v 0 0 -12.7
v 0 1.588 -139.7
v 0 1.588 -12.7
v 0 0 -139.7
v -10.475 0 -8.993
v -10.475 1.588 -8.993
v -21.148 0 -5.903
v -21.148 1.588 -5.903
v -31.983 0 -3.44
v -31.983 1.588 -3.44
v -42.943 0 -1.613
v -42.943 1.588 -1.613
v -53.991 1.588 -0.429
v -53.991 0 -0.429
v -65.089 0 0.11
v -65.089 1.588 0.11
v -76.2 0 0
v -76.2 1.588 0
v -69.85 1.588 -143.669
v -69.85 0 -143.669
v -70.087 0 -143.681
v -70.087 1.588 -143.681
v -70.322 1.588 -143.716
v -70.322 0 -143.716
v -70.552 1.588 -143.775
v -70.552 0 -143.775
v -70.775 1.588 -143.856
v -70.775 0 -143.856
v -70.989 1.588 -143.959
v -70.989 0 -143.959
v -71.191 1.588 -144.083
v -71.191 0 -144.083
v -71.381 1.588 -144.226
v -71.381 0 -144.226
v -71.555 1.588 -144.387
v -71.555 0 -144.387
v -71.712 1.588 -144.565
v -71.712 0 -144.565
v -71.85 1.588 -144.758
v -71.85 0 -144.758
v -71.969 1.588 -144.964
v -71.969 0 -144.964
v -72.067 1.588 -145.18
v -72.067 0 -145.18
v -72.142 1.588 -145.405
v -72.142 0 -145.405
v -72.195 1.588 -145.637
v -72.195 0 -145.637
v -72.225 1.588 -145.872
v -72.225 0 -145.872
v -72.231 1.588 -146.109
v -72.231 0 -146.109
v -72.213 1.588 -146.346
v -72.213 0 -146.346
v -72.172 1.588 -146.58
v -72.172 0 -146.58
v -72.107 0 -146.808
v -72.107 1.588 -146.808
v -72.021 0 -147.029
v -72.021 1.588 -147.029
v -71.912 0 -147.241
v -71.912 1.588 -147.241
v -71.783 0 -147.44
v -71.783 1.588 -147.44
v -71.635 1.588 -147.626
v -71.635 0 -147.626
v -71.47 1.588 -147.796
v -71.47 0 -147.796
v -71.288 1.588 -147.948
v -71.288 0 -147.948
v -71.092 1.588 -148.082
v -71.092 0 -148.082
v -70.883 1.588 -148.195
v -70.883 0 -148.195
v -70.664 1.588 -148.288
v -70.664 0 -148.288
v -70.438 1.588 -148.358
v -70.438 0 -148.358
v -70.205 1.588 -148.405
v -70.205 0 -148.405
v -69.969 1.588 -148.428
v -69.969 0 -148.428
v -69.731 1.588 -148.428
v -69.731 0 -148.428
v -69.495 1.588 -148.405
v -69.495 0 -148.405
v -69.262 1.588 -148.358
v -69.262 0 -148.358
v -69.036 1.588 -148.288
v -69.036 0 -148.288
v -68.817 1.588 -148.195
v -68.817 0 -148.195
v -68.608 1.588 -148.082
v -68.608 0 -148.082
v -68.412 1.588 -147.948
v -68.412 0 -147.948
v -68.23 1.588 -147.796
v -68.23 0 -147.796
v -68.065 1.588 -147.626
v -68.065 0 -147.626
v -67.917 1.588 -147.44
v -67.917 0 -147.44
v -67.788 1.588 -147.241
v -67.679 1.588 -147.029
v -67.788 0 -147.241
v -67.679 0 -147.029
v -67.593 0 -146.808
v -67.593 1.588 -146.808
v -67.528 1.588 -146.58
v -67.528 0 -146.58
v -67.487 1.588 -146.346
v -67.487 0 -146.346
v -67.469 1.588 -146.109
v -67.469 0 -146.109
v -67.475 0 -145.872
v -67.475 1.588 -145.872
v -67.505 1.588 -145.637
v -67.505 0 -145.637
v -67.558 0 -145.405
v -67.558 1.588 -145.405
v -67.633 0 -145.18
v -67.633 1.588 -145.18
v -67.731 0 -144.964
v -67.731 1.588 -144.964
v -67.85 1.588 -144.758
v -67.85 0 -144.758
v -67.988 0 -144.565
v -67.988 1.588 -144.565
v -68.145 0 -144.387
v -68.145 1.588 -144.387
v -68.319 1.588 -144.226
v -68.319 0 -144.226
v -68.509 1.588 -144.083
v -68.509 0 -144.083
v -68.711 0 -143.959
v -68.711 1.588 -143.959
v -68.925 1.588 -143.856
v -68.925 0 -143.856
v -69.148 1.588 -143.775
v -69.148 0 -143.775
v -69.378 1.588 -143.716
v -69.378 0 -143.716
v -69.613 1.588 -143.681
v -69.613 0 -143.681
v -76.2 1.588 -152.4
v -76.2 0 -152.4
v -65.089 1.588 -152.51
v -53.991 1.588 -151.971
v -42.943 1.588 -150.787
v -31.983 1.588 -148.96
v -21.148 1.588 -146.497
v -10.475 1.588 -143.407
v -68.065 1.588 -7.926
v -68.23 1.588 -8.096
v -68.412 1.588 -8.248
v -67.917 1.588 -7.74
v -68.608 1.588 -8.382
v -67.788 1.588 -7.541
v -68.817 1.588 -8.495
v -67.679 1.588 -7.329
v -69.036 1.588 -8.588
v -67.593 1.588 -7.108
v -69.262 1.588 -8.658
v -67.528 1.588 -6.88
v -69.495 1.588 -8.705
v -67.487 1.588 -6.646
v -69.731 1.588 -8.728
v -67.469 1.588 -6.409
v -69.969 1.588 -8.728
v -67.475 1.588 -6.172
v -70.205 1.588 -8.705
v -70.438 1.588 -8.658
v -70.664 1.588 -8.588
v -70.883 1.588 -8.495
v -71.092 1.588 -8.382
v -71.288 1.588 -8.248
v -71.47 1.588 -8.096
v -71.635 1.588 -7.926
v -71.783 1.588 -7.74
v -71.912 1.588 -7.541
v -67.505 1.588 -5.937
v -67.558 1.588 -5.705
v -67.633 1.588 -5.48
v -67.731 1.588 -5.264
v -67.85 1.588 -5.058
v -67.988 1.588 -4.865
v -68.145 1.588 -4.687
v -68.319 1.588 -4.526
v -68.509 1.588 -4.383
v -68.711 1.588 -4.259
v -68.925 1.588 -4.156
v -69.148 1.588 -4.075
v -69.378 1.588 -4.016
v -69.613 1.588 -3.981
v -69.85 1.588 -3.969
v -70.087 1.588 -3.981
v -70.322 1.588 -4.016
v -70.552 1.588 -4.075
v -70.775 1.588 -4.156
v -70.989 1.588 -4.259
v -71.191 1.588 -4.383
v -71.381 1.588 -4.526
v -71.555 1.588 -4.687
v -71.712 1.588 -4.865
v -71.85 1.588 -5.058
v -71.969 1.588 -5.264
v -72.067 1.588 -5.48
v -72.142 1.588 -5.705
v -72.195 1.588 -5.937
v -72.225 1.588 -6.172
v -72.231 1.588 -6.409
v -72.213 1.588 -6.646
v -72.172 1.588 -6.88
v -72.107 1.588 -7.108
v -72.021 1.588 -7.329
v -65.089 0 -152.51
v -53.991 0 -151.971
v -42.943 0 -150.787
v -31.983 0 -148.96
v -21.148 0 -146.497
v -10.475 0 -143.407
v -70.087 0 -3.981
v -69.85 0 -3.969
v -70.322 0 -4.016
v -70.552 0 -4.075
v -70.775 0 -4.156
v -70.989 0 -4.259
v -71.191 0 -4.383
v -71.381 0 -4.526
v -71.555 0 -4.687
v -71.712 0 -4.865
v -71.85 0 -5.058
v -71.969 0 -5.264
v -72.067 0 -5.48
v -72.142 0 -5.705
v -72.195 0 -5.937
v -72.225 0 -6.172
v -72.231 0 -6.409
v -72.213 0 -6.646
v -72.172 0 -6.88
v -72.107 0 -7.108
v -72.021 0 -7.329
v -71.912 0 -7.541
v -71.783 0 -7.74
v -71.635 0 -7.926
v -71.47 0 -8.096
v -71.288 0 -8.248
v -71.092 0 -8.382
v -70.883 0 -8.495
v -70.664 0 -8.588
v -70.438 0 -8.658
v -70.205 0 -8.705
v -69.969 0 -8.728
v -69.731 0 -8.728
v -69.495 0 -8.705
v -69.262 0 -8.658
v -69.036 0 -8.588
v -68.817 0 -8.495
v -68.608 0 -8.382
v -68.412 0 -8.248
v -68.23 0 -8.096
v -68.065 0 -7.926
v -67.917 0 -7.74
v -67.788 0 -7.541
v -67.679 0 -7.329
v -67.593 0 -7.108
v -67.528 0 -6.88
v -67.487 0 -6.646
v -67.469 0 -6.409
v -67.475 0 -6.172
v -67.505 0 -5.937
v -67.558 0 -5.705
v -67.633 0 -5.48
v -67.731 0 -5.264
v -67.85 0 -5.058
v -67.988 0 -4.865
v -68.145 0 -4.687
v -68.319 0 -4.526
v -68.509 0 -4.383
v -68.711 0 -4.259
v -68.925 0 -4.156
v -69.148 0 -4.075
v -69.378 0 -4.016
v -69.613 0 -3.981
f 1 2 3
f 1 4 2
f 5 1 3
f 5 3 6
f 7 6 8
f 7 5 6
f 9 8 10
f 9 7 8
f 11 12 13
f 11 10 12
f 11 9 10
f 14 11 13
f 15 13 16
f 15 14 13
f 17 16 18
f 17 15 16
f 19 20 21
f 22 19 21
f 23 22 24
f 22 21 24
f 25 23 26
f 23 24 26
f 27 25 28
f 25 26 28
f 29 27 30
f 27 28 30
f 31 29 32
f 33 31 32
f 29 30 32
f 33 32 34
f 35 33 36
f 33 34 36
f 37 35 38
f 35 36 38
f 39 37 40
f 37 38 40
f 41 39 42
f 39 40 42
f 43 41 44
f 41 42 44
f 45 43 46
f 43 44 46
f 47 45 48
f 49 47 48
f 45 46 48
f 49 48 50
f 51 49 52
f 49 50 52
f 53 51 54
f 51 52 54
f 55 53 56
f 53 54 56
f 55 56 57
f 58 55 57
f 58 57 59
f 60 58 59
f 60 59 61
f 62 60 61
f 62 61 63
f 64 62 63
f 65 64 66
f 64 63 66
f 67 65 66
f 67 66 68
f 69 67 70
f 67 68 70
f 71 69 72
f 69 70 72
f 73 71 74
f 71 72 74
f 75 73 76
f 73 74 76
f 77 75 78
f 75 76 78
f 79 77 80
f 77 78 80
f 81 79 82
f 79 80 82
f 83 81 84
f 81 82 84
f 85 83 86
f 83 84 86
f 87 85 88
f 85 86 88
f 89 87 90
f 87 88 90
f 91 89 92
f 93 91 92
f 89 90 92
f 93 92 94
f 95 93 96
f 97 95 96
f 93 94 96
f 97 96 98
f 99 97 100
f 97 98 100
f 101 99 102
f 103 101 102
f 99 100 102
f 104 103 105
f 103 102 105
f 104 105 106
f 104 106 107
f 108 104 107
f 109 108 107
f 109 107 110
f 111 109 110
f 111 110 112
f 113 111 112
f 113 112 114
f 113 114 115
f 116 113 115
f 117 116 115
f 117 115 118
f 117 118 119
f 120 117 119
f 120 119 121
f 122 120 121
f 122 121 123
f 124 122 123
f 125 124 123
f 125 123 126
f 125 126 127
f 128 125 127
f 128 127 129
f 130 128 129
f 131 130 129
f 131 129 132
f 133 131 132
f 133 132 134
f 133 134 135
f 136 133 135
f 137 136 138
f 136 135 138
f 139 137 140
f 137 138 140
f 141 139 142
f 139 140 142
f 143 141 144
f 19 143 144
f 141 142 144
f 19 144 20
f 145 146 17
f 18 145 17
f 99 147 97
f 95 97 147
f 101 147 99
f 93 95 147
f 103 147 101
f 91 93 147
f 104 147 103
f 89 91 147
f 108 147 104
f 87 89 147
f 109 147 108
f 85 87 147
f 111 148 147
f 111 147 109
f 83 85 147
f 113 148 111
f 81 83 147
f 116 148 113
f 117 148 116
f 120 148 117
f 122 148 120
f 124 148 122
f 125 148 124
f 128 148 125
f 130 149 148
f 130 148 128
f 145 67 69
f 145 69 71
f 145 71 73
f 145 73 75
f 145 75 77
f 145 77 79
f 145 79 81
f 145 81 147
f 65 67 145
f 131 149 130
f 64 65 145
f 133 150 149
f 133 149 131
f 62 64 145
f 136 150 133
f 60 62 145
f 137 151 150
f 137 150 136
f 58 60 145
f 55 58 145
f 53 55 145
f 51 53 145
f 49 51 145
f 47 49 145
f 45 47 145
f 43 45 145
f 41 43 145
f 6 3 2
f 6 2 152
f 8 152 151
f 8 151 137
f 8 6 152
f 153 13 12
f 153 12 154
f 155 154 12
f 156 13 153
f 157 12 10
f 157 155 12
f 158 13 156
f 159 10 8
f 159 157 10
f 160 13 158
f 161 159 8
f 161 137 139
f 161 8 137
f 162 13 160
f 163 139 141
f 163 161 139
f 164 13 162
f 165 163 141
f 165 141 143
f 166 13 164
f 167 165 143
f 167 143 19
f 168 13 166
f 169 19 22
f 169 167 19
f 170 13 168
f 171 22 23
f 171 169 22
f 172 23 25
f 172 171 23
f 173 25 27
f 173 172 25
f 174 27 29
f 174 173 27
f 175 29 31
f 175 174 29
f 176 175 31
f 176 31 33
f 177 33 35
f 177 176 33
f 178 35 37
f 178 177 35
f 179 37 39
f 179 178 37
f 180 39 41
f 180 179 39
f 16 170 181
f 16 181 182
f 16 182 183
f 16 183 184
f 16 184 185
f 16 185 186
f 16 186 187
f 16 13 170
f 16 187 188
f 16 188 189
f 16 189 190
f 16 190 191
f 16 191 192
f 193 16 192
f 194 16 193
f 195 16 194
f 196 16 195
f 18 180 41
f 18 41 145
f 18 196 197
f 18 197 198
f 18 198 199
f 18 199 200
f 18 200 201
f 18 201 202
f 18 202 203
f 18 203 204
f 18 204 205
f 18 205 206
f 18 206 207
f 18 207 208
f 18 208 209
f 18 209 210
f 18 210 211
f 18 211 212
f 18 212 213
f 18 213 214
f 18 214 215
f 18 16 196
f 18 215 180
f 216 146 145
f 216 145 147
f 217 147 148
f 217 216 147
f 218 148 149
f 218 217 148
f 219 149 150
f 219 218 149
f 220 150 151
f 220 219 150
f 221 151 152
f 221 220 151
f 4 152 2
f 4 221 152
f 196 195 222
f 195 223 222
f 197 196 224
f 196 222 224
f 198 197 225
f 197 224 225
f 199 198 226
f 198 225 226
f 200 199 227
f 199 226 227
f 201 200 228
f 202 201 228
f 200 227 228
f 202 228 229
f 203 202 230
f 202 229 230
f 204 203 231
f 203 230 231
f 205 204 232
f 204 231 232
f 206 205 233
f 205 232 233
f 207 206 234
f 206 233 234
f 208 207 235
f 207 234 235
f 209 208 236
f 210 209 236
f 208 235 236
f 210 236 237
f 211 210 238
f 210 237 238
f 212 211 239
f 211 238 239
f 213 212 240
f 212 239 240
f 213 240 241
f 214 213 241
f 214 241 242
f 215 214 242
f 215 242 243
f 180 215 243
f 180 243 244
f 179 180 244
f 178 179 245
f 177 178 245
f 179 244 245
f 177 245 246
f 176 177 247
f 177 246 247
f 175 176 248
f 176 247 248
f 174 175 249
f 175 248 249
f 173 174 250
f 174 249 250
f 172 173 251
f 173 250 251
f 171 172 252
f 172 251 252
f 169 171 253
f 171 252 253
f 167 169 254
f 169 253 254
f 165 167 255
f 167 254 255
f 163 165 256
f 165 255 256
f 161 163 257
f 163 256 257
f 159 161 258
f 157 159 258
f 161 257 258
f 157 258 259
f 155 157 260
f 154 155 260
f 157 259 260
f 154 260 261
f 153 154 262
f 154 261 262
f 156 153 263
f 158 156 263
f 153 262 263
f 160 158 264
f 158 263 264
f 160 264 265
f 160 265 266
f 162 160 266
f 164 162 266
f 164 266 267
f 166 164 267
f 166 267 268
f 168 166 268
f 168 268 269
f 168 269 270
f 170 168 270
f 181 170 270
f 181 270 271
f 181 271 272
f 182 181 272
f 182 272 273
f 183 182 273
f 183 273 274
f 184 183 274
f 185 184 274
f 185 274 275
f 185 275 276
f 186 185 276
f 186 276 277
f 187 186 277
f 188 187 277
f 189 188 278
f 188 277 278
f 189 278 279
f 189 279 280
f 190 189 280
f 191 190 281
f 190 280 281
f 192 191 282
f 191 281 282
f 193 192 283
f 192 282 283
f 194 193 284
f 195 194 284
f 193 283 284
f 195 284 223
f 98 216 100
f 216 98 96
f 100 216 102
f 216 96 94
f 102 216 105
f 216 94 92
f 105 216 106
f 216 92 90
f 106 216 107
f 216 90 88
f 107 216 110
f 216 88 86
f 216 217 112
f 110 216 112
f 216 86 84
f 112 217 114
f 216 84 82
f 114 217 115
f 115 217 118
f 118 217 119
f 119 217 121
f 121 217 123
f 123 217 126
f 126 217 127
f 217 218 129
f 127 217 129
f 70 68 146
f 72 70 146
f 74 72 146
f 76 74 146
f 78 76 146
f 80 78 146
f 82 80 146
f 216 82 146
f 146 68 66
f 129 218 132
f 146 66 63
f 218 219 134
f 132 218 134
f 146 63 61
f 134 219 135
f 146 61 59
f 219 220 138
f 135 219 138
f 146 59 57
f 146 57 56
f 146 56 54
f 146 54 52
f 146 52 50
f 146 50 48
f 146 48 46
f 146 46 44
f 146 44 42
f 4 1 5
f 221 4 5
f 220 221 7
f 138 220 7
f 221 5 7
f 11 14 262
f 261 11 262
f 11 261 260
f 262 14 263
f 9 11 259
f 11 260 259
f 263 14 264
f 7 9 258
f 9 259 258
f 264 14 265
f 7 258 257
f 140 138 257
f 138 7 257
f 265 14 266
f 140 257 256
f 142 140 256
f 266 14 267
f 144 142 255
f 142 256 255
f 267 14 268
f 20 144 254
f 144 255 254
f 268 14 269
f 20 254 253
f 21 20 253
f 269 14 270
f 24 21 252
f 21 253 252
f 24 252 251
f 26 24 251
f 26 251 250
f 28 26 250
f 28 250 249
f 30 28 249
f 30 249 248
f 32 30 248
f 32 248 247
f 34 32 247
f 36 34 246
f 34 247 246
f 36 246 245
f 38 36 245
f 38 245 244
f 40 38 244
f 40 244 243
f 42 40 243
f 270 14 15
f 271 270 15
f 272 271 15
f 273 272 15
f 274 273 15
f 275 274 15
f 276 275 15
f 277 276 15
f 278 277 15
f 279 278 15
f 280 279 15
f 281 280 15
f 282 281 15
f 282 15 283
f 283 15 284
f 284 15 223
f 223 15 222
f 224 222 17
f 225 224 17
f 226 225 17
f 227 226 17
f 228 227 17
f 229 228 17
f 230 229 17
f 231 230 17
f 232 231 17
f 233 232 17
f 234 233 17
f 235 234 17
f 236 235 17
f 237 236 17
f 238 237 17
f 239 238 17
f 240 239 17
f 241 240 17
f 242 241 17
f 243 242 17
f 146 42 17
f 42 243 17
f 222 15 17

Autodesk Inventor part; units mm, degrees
ref_plane "YZ Plane" through (0, 0, 0) normal (1, 0, 0) x (0, 1, 0)
ref_plane "XZ Plane" through (0, 0, 0) normal (0, 1, 0) x (-1, 0, 0)
ref_plane "XY Plane" through (0, 0, 0) normal (0, 0, 1) x (1, 0, 0)
sketch "Sketch1" plane through (0, 0, 0) normal (0, 1, 0) x (-1, 0, 0)
  line L0 (76.2, -152.4) -> (76.2, 0)
  line L1 (0, 0) -> (0, -12.7)
  arc A0 (76.2, 0) -> (0, -12.7) centre (68.7675, -190.355) ccw
  line L2 (0, -152.4) -> (0, -139.7)
  arc A1 (0, -139.7) -> (76.2, -152.4) centre (68.7675, 37.955) ccw
  line L3 (0, -139.7) -> (0, -12.7)
  dimension "d0" = 152.4
  dimension "d1" = 76.2
  dimension "d17" = 12.7
  dimension "d18" = 190.5
  dimension "d20" = 190.5
extrude "Extrusion1" add sketch "Sketch1" along normal blind 1.5875
sketch "Sketch2" plane through (0, 1.5875, 0) normal (0, 1, 0) x (1, 0, 0)
  line L0 (-76.2, 0) -> (0, 0) projected
  line L1 (-76.2, 0) -> (-76.2, 12.7)
  line L2 (-76.2, 152.4) -> (-76.2, 0) projected
  line L3 (-76.2, 12.7) -> (-63.5, 0)
  line L4 (-63.5, 0) -> (-76.2, 0)
  line L5 (-76.2, 0) -> (-69.85, 6.35)
  line L6 (0, 0) -> (0, 12.7)
  line L7 (0, 0) -> (0, 152.4) projected
  line L8 (-76.2, 152.4) -> (-63.5, 152.4)
  line L9 (0, 152.4) -> (-76.2, 152.4) projected
  line L10 (-63.5, 152.4) -> (-76.2, 139.7)
  line L11 (-76.2, 139.7) -> (-76.2, 152.4)
  line L12 (-76.2, 152.4) -> (-69.85, 146.05)
  line L13 (-76.2, 152.4) -> (-67.2197, 152.4) construction
  dimension "d4" = 12.7
  dimension "d5" = 45
  dimension "d6" = 12.7
  dimension "d14" = 12.7
  dimension "d15" = 45
  dimension "d16" = 45
hole "Hole1" at (-69.85, 1.5875, -6.35) at (-69.85, 1.5875, -146.05) direction (0, -1, 0) diameter 4.7625 end through all
properties part number "shoot2" material "ABS Plastic"
